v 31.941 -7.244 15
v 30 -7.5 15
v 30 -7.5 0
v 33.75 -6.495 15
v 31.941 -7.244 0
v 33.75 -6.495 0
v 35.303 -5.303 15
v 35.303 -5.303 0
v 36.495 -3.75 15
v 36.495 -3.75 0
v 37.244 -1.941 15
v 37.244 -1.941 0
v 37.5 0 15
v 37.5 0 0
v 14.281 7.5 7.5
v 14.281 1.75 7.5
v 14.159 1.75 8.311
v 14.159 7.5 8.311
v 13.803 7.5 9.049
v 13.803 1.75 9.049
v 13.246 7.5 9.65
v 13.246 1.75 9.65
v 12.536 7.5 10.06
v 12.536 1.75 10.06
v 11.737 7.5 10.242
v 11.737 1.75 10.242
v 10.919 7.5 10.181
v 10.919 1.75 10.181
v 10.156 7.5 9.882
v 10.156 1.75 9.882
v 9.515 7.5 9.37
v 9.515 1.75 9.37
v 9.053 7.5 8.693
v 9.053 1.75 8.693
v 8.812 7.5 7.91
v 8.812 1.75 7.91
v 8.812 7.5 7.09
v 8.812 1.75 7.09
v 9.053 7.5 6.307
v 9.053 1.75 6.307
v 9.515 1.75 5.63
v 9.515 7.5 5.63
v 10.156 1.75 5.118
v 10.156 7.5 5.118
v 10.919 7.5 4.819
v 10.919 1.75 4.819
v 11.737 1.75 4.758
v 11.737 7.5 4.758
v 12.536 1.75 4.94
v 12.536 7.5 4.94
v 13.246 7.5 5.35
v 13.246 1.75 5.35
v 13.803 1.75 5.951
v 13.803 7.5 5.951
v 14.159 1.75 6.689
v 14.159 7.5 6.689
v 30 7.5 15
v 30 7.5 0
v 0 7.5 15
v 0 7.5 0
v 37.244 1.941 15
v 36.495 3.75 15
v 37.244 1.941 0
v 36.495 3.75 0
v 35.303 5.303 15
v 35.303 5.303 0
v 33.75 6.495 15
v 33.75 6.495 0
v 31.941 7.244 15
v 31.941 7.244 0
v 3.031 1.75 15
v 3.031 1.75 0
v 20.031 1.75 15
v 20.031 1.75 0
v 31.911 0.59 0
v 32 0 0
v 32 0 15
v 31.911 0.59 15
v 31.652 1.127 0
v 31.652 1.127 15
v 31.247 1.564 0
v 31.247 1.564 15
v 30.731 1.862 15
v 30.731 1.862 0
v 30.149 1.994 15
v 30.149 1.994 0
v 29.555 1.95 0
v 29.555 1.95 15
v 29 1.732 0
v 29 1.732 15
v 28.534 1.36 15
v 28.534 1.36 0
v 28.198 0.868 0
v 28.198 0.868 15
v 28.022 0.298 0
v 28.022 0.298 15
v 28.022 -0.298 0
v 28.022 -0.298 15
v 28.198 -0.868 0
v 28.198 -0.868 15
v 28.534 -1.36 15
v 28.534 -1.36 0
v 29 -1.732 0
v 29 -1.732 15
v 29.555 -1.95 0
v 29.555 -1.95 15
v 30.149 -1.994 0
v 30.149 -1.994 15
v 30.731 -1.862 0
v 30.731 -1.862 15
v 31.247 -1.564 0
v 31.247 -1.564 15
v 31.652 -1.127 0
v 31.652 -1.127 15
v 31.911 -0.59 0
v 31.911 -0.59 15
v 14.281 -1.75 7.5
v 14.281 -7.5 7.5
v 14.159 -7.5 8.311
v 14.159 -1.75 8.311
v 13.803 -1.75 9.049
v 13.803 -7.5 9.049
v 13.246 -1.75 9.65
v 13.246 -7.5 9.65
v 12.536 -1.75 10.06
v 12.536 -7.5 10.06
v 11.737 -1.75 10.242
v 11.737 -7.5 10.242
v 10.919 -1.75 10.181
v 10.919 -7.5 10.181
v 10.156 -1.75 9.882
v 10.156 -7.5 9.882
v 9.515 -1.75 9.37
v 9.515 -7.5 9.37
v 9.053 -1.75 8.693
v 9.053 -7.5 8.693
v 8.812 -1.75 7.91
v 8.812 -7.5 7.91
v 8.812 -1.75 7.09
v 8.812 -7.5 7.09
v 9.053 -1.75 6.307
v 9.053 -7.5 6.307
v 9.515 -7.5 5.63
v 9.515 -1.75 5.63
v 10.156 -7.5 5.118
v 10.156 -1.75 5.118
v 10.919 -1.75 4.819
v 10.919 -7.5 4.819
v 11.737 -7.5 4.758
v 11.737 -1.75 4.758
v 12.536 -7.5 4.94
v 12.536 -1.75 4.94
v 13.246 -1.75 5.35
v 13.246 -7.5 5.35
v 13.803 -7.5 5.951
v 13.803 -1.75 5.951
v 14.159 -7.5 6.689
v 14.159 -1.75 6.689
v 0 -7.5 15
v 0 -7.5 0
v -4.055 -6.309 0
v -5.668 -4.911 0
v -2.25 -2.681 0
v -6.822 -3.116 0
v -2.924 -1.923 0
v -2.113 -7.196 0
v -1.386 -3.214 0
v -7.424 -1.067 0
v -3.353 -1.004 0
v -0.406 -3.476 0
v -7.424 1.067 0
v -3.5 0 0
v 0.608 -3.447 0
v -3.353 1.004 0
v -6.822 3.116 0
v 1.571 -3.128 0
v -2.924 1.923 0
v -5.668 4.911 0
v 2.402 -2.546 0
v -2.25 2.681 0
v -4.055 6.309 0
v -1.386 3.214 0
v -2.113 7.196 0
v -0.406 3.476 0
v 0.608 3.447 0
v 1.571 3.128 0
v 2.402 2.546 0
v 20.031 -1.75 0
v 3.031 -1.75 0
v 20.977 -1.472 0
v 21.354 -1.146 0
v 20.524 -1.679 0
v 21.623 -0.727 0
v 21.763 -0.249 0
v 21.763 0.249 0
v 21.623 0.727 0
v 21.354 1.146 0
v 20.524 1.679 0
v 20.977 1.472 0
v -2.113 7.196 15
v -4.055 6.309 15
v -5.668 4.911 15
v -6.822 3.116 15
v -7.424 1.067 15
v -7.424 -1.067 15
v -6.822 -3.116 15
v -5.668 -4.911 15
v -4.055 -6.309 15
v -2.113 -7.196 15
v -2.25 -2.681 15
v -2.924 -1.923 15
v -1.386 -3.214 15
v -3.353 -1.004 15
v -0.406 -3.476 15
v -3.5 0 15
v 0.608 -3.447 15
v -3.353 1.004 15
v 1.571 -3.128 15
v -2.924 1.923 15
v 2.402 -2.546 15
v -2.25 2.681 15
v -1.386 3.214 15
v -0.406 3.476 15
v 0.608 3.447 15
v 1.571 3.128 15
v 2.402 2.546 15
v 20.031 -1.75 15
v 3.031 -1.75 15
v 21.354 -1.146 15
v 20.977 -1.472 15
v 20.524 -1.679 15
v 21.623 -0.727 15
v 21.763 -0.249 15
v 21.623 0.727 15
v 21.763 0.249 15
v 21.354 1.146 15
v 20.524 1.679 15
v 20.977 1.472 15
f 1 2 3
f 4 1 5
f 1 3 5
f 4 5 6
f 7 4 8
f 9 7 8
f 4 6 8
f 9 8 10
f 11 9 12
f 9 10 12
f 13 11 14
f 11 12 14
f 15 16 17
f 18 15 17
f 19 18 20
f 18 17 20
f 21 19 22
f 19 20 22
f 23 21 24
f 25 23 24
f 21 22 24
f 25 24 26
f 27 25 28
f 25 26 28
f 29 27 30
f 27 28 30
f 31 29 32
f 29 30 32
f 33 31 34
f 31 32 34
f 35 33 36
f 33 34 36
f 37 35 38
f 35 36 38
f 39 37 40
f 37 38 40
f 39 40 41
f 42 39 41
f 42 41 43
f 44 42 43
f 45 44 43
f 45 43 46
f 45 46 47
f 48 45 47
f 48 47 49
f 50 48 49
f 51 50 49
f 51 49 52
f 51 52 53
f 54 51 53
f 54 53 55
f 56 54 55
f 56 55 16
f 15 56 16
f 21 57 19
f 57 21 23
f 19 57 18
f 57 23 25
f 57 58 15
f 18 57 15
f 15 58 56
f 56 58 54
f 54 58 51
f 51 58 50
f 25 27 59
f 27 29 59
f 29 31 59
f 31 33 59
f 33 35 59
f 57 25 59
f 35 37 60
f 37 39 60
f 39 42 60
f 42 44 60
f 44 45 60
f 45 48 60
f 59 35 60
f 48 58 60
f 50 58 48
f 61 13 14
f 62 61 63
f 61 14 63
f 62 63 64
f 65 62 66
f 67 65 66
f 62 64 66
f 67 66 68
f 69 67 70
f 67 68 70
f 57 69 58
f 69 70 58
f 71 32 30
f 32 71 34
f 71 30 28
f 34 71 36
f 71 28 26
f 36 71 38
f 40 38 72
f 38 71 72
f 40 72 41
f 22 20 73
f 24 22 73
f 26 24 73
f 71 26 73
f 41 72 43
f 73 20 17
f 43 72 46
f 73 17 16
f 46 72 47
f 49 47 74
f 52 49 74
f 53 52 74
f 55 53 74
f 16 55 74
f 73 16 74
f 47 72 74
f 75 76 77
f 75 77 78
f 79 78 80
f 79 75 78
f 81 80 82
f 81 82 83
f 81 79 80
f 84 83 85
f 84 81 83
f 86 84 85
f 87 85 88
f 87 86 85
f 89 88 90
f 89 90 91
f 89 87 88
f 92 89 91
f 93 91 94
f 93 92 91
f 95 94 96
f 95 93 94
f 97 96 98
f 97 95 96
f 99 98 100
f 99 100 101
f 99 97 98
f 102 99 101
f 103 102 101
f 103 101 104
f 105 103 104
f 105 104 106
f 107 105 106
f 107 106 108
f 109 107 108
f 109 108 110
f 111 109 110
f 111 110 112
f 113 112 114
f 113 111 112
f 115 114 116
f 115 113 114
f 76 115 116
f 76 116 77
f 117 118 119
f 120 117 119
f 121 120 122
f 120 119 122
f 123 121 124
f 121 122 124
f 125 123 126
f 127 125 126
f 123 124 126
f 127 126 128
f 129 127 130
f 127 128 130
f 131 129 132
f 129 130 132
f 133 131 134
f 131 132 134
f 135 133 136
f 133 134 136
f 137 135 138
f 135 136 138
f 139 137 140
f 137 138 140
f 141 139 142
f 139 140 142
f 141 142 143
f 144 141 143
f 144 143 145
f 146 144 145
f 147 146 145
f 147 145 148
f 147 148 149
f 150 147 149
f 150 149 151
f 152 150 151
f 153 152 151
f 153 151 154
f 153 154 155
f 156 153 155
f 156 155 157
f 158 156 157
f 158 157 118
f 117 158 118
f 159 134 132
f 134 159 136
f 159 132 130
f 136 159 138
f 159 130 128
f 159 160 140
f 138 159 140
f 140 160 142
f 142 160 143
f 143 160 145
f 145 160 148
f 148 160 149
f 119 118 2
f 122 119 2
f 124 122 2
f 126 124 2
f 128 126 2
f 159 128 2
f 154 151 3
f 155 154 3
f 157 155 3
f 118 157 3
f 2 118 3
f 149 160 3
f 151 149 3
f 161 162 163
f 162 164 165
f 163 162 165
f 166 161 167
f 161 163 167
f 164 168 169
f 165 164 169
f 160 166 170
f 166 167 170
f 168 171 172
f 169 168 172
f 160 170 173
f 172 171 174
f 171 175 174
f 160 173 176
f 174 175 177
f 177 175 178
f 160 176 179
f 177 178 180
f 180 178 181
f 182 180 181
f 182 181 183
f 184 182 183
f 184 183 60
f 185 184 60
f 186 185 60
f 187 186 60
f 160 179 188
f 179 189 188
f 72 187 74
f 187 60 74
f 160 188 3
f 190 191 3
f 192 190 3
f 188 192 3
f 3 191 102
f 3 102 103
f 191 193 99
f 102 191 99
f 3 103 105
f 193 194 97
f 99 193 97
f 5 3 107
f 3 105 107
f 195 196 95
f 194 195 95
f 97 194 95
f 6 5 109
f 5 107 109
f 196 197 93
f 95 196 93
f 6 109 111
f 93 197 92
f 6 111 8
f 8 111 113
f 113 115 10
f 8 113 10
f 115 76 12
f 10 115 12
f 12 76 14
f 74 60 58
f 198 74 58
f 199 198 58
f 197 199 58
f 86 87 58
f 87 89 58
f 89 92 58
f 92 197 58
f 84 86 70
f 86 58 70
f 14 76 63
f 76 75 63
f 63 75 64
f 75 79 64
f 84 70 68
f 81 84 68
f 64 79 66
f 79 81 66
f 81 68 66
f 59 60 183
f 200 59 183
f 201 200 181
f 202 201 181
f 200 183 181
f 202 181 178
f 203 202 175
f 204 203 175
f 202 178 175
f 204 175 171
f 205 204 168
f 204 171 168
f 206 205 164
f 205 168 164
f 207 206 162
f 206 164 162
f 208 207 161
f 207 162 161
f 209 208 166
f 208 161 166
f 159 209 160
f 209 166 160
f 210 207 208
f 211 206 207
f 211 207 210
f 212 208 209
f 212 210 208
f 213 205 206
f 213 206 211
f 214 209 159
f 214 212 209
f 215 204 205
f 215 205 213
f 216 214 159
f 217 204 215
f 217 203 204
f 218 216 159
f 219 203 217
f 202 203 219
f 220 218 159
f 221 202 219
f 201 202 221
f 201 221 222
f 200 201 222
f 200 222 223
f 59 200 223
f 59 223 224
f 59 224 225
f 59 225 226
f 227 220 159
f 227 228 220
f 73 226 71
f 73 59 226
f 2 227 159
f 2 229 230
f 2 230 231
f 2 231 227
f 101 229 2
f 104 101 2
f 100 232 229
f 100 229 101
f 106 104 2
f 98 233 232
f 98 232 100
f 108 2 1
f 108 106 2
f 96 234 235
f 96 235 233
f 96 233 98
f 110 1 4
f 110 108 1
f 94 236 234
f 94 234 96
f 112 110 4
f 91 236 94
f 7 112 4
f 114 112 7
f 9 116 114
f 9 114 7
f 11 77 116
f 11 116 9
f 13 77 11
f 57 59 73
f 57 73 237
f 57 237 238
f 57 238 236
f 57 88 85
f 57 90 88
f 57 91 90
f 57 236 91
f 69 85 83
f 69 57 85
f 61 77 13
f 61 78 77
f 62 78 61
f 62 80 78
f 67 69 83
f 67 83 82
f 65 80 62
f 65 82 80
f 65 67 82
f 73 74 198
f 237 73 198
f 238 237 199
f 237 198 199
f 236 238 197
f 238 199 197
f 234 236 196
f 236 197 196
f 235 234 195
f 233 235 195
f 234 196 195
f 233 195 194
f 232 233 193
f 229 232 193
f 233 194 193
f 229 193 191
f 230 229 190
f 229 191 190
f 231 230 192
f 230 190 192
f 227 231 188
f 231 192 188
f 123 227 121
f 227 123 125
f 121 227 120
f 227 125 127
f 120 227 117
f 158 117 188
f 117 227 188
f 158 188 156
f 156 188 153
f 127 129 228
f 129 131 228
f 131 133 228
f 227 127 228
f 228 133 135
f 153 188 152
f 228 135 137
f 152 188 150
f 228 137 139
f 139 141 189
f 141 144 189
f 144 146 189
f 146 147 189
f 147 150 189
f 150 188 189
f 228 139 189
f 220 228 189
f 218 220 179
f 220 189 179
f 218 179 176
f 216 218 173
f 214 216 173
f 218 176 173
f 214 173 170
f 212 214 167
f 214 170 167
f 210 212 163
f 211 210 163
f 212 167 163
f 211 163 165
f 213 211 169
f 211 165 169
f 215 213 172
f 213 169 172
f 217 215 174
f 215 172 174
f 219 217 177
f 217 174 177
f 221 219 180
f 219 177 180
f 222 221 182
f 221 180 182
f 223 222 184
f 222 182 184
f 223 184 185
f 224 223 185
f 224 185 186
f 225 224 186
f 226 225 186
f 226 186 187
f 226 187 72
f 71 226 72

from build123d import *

# Parameters (mm, degrees)
F0_R     = 2
F1_DEPTH = 15
F2_R     = 2.75
F3_DEPTH = 15.001


with BuildPart() as f1:
    # F0 (on Top) → F1 (new body)
    with BuildSketch(Plane.XY):
        with BuildLine():
            ThreePointArc((7.292976, 1.75), (4.643544, 5.889609), (0, 7.5))
            ThreePointArc((0, 7.5), (-7.5, 0), (0, -7.5))
            ThreePointArc((0, -7.5), (4.643544, -5.889609), (7.292976, -1.75))
            Line((7.292976, -1.75), (3.031089, -1.75))
            ThreePointArc((3.031089, -1.75), (-3.5, 0), (3.031089, 1.75))
            Line((3.031089, 1.75), (7.292976, 1.75))
        make_face()
        with BuildLine():
            ThreePointArc((30, -7.5), (22.5, 0), (30, 7.5))
            Line((30, 7.5), (0, 7.5))
            ThreePointArc((0, 7.5), (4.643544, 5.889609), (7.292976, 1.75))
            Line((7.292976, 1.75), (20.031089, 1.75))
            ThreePointArc((20.031089, 1.75), (21.781089, 0), (20.031089, -1.75))
            Line((20.031089, -1.75), (7.292976, -1.75))
            ThreePointArc((7.292976, -1.75), (4.643544, -5.889609), (0, -7.5))
            Line((0, -7.5), (30, -7.5))
        make_face()
        with BuildLine():
            ThreePointArc((30, -7.5), (35.303301, -5.303301), (37.5, 0))
            ThreePointArc((37.5, 0), (35.303301, 5.303301), (30, 7.5))
            ThreePointArc((30, 7.5), (22.5, 0), (30, -7.5))
        make_face()
        with Locations((30, 0)):
            Circle(F0_R, mode=Mode.SUBTRACT)
    extrude(amount=F1_DEPTH)

    # F2 (on face) → F3 (cut, through all)
    with BuildSketch(Plane.XZ.offset(7.5)):
        with Locations((11.531089, 7.5)):
            Circle(F2_R)
    extrude(amount=-F3_DEPTH, mode=Mode.SUBTRACT)


solid = f1.part
